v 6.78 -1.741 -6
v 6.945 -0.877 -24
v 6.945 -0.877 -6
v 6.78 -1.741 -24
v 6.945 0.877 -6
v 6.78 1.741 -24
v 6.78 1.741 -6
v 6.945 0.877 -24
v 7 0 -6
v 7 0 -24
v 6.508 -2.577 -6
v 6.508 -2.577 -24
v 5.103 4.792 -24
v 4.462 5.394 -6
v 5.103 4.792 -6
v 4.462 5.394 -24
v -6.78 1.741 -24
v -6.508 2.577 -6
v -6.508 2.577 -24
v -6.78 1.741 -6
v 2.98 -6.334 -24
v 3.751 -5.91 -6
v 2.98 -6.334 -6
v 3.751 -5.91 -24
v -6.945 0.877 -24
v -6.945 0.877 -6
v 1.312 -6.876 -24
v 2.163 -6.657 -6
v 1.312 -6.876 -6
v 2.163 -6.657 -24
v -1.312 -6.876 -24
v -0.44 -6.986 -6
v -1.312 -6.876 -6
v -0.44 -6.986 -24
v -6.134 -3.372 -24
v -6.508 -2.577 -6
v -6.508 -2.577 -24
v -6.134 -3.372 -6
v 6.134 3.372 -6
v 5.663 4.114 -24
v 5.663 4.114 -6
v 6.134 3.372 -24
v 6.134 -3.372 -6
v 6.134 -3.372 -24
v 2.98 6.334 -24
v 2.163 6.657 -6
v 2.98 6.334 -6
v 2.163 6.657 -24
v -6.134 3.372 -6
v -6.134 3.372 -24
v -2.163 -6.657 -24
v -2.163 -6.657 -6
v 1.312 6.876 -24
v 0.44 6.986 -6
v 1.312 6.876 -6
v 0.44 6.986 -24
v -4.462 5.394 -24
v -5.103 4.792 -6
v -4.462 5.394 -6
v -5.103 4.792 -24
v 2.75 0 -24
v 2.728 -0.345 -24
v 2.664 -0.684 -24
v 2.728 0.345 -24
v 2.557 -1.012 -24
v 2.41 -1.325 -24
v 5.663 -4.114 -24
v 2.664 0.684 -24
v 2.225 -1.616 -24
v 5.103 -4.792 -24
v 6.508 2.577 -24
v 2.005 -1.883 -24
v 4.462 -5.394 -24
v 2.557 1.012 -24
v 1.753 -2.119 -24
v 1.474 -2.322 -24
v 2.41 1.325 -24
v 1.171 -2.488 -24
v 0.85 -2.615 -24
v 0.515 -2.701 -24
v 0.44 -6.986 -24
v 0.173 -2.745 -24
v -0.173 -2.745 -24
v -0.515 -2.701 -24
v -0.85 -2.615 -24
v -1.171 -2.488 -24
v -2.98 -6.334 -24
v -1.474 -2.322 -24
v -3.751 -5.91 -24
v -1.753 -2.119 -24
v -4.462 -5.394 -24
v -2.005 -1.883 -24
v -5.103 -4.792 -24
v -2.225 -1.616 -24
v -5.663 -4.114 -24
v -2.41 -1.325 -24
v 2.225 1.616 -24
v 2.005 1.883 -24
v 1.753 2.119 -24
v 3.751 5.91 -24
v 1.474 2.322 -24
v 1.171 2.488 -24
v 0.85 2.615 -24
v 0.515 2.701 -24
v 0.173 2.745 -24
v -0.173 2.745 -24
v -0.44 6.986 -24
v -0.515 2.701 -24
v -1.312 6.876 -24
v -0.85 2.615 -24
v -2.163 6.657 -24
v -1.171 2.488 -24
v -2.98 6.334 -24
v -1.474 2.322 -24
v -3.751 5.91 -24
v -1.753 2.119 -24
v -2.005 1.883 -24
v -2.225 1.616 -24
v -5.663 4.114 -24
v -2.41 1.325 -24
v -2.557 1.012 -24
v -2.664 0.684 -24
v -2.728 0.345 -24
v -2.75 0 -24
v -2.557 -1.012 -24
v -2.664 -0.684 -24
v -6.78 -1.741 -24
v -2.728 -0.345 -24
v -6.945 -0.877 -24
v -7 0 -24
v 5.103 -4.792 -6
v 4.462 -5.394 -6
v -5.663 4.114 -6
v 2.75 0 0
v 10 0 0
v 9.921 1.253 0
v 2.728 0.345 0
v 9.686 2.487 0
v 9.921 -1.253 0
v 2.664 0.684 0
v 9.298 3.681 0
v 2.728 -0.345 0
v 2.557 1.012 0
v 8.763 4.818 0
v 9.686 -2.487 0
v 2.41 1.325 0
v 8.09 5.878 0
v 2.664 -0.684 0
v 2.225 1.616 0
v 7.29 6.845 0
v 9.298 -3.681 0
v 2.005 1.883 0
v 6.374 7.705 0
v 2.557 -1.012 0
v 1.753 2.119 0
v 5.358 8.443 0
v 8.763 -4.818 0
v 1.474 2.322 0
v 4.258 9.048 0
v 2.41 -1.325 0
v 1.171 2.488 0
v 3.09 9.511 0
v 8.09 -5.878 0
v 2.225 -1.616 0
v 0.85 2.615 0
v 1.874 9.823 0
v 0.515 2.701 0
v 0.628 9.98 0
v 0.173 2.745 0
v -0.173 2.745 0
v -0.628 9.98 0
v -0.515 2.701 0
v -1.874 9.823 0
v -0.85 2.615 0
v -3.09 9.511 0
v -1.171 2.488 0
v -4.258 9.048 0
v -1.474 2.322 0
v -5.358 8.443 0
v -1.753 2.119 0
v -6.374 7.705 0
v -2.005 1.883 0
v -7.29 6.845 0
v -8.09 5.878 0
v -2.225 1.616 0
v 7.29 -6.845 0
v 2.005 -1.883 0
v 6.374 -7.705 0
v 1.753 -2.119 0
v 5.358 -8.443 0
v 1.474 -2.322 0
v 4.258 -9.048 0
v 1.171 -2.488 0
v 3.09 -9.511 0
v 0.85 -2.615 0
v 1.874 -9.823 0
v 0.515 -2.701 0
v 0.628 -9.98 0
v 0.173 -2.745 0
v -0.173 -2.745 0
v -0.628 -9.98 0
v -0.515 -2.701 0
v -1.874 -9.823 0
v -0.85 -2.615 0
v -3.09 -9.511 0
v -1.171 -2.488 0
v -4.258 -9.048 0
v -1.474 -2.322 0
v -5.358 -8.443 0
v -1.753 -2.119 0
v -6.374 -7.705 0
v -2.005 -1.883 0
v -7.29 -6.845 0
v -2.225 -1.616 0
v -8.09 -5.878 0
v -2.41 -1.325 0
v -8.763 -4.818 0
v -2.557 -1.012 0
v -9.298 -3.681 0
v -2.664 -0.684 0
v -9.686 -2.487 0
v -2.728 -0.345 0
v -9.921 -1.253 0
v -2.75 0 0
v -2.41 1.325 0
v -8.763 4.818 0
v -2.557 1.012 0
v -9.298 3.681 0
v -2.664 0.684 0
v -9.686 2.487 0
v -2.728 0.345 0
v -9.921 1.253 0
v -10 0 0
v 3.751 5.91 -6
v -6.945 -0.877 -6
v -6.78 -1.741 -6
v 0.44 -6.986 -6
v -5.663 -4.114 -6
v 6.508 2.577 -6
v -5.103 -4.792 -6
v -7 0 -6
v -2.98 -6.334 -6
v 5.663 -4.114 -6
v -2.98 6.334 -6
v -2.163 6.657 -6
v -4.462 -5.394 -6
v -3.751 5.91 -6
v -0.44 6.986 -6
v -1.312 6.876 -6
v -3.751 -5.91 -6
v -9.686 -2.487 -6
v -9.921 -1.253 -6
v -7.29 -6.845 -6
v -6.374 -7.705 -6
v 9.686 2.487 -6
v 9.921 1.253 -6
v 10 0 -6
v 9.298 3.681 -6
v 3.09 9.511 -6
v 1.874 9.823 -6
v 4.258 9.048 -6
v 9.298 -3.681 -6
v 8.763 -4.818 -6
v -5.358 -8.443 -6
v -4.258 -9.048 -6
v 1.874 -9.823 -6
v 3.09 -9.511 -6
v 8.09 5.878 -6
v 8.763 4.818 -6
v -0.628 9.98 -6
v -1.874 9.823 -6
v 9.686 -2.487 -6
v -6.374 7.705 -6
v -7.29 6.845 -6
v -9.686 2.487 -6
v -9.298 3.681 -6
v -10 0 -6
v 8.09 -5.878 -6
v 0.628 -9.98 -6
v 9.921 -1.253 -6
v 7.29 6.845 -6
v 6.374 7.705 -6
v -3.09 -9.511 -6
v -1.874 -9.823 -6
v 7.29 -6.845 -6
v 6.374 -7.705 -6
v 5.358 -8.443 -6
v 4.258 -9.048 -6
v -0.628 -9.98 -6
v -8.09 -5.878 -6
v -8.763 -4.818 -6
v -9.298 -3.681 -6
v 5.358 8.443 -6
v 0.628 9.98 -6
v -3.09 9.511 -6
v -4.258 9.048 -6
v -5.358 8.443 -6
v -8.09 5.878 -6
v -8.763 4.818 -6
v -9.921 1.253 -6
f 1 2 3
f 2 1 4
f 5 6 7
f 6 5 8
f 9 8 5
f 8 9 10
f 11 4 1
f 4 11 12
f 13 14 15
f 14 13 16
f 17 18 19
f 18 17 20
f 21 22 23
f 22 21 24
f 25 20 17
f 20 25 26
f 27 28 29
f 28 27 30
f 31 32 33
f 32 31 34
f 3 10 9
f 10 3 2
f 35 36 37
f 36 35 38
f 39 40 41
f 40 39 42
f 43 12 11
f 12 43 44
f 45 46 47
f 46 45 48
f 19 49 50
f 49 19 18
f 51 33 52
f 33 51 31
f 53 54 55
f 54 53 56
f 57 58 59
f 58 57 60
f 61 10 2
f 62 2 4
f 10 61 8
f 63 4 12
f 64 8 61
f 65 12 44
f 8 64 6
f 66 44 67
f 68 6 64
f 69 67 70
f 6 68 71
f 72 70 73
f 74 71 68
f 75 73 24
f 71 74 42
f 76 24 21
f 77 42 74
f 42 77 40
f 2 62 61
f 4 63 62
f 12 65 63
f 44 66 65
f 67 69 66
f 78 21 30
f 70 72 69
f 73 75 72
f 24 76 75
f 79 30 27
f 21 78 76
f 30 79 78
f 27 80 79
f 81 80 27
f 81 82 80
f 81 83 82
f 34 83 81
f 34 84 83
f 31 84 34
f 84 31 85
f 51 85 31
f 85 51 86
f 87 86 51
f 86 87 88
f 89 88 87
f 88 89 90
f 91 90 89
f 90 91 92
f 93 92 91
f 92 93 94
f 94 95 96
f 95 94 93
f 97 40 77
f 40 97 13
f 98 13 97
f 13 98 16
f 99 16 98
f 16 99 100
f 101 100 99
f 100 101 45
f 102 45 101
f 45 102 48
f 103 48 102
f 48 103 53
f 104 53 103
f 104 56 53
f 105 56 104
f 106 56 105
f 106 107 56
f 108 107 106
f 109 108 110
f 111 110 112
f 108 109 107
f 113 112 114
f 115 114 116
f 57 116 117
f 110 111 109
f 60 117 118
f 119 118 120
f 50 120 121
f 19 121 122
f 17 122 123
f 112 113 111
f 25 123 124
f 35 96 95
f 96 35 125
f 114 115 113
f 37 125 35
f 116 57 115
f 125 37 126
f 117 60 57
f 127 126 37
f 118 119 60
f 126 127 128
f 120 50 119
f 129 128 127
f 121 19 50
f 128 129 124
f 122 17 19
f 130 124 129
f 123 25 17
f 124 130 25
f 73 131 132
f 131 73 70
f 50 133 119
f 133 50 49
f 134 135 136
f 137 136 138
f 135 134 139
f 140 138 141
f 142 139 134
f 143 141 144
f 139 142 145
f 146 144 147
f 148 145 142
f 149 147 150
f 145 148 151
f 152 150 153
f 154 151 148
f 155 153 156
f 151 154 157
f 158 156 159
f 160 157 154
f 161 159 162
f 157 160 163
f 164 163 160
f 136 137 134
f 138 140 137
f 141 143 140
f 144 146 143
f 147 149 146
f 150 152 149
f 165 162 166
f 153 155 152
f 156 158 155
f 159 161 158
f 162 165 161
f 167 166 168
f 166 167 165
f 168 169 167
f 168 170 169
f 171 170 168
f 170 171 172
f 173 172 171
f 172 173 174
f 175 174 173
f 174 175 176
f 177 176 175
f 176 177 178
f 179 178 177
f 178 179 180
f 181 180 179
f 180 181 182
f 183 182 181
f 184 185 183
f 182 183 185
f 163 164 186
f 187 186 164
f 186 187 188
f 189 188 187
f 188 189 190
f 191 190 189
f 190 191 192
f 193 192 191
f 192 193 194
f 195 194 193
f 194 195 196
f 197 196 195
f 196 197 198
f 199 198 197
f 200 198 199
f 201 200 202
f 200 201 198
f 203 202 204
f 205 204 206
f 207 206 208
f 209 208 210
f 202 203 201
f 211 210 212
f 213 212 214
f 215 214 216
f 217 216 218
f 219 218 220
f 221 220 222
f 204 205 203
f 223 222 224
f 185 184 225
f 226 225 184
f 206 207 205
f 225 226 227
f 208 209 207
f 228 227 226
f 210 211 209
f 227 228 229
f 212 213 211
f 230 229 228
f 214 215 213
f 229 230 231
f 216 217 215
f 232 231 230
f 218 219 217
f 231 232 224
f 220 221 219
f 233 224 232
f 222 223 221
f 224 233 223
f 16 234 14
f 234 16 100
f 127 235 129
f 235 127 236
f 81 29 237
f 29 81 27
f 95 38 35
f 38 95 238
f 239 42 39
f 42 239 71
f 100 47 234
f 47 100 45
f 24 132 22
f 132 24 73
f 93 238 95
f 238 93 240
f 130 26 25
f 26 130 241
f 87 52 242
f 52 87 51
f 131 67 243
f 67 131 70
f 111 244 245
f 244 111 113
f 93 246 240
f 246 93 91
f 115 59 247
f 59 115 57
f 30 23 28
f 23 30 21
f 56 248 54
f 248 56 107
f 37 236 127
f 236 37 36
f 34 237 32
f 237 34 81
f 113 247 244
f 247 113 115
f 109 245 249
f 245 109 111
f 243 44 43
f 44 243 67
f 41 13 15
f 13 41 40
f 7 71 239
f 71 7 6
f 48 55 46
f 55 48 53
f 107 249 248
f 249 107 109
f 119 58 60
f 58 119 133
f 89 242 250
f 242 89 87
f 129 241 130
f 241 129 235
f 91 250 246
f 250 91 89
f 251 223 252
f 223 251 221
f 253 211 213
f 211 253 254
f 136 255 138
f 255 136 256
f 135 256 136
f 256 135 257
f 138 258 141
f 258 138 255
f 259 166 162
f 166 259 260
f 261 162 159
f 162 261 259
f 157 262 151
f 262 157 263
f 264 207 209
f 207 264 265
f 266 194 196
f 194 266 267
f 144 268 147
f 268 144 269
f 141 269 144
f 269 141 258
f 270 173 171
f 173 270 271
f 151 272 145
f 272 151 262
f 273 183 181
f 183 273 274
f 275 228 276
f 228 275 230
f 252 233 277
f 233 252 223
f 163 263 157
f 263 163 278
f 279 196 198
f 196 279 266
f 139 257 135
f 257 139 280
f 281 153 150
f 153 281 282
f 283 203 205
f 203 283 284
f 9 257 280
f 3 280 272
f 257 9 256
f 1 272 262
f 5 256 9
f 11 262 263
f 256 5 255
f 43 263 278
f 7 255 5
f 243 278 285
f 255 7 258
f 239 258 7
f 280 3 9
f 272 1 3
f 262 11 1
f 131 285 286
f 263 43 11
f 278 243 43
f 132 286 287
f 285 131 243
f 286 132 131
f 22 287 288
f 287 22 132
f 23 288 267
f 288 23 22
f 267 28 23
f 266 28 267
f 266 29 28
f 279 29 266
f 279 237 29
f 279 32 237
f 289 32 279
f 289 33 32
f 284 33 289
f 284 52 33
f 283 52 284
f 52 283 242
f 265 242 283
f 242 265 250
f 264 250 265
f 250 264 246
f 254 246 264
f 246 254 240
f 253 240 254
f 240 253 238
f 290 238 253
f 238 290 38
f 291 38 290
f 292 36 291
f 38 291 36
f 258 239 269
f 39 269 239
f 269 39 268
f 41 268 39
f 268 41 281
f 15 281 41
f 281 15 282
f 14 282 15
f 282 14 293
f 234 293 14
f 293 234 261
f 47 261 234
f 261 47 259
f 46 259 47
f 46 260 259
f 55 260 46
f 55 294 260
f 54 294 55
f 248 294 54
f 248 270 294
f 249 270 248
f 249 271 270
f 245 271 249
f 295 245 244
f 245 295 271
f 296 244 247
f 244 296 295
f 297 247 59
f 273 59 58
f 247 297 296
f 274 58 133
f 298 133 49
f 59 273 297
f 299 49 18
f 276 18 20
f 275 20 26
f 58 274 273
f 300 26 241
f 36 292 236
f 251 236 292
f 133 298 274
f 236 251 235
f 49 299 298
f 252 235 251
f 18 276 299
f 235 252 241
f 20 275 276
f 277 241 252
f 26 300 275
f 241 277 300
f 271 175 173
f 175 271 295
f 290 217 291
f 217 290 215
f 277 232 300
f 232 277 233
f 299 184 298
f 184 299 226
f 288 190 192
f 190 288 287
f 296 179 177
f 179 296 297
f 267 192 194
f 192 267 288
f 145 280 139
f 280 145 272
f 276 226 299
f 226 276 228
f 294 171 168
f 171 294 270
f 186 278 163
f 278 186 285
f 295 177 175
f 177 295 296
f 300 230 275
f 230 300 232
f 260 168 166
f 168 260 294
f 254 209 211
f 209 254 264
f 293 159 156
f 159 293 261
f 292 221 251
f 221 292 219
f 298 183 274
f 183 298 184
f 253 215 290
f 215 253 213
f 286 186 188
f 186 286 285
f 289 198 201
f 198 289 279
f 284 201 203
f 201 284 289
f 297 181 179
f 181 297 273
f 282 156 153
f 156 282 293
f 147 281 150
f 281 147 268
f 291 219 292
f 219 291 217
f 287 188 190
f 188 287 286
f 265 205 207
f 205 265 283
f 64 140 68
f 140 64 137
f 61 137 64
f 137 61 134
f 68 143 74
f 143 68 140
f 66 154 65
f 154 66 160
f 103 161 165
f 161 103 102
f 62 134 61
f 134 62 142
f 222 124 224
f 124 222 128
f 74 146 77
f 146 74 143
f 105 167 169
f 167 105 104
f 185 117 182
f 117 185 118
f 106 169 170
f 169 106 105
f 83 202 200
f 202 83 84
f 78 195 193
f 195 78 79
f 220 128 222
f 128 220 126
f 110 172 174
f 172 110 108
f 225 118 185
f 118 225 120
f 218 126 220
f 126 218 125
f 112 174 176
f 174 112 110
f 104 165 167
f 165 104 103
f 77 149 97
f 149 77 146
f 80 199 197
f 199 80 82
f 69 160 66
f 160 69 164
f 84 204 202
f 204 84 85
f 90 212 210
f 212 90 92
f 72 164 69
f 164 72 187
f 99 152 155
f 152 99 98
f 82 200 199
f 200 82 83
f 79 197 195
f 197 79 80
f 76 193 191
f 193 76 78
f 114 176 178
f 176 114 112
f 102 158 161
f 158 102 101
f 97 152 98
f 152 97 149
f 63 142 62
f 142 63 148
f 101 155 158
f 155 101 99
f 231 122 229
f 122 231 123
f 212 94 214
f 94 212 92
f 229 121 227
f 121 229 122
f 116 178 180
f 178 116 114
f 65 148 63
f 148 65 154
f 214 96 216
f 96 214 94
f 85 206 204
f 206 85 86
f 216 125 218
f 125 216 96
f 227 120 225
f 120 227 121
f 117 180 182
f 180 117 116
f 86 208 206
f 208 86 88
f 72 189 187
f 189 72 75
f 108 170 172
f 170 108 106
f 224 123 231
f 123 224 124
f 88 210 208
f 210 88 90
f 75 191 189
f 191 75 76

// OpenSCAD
$fn = 50;


difference() {
	union() {
		translate(v = [0, 0, -24.0000000000]) {
			cylinder(h = 24, r = 7.0000000000);
		}
		translate(v = [0, 0, -6.0000000000]) {
			cylinder(h = 6, r = 10.0000000000);
		}
	}
	union() {
		#translate(v = [0, 0, -24]) {
			cylinder(h = 24, r = 2.7500000000);
		}
	}
}
